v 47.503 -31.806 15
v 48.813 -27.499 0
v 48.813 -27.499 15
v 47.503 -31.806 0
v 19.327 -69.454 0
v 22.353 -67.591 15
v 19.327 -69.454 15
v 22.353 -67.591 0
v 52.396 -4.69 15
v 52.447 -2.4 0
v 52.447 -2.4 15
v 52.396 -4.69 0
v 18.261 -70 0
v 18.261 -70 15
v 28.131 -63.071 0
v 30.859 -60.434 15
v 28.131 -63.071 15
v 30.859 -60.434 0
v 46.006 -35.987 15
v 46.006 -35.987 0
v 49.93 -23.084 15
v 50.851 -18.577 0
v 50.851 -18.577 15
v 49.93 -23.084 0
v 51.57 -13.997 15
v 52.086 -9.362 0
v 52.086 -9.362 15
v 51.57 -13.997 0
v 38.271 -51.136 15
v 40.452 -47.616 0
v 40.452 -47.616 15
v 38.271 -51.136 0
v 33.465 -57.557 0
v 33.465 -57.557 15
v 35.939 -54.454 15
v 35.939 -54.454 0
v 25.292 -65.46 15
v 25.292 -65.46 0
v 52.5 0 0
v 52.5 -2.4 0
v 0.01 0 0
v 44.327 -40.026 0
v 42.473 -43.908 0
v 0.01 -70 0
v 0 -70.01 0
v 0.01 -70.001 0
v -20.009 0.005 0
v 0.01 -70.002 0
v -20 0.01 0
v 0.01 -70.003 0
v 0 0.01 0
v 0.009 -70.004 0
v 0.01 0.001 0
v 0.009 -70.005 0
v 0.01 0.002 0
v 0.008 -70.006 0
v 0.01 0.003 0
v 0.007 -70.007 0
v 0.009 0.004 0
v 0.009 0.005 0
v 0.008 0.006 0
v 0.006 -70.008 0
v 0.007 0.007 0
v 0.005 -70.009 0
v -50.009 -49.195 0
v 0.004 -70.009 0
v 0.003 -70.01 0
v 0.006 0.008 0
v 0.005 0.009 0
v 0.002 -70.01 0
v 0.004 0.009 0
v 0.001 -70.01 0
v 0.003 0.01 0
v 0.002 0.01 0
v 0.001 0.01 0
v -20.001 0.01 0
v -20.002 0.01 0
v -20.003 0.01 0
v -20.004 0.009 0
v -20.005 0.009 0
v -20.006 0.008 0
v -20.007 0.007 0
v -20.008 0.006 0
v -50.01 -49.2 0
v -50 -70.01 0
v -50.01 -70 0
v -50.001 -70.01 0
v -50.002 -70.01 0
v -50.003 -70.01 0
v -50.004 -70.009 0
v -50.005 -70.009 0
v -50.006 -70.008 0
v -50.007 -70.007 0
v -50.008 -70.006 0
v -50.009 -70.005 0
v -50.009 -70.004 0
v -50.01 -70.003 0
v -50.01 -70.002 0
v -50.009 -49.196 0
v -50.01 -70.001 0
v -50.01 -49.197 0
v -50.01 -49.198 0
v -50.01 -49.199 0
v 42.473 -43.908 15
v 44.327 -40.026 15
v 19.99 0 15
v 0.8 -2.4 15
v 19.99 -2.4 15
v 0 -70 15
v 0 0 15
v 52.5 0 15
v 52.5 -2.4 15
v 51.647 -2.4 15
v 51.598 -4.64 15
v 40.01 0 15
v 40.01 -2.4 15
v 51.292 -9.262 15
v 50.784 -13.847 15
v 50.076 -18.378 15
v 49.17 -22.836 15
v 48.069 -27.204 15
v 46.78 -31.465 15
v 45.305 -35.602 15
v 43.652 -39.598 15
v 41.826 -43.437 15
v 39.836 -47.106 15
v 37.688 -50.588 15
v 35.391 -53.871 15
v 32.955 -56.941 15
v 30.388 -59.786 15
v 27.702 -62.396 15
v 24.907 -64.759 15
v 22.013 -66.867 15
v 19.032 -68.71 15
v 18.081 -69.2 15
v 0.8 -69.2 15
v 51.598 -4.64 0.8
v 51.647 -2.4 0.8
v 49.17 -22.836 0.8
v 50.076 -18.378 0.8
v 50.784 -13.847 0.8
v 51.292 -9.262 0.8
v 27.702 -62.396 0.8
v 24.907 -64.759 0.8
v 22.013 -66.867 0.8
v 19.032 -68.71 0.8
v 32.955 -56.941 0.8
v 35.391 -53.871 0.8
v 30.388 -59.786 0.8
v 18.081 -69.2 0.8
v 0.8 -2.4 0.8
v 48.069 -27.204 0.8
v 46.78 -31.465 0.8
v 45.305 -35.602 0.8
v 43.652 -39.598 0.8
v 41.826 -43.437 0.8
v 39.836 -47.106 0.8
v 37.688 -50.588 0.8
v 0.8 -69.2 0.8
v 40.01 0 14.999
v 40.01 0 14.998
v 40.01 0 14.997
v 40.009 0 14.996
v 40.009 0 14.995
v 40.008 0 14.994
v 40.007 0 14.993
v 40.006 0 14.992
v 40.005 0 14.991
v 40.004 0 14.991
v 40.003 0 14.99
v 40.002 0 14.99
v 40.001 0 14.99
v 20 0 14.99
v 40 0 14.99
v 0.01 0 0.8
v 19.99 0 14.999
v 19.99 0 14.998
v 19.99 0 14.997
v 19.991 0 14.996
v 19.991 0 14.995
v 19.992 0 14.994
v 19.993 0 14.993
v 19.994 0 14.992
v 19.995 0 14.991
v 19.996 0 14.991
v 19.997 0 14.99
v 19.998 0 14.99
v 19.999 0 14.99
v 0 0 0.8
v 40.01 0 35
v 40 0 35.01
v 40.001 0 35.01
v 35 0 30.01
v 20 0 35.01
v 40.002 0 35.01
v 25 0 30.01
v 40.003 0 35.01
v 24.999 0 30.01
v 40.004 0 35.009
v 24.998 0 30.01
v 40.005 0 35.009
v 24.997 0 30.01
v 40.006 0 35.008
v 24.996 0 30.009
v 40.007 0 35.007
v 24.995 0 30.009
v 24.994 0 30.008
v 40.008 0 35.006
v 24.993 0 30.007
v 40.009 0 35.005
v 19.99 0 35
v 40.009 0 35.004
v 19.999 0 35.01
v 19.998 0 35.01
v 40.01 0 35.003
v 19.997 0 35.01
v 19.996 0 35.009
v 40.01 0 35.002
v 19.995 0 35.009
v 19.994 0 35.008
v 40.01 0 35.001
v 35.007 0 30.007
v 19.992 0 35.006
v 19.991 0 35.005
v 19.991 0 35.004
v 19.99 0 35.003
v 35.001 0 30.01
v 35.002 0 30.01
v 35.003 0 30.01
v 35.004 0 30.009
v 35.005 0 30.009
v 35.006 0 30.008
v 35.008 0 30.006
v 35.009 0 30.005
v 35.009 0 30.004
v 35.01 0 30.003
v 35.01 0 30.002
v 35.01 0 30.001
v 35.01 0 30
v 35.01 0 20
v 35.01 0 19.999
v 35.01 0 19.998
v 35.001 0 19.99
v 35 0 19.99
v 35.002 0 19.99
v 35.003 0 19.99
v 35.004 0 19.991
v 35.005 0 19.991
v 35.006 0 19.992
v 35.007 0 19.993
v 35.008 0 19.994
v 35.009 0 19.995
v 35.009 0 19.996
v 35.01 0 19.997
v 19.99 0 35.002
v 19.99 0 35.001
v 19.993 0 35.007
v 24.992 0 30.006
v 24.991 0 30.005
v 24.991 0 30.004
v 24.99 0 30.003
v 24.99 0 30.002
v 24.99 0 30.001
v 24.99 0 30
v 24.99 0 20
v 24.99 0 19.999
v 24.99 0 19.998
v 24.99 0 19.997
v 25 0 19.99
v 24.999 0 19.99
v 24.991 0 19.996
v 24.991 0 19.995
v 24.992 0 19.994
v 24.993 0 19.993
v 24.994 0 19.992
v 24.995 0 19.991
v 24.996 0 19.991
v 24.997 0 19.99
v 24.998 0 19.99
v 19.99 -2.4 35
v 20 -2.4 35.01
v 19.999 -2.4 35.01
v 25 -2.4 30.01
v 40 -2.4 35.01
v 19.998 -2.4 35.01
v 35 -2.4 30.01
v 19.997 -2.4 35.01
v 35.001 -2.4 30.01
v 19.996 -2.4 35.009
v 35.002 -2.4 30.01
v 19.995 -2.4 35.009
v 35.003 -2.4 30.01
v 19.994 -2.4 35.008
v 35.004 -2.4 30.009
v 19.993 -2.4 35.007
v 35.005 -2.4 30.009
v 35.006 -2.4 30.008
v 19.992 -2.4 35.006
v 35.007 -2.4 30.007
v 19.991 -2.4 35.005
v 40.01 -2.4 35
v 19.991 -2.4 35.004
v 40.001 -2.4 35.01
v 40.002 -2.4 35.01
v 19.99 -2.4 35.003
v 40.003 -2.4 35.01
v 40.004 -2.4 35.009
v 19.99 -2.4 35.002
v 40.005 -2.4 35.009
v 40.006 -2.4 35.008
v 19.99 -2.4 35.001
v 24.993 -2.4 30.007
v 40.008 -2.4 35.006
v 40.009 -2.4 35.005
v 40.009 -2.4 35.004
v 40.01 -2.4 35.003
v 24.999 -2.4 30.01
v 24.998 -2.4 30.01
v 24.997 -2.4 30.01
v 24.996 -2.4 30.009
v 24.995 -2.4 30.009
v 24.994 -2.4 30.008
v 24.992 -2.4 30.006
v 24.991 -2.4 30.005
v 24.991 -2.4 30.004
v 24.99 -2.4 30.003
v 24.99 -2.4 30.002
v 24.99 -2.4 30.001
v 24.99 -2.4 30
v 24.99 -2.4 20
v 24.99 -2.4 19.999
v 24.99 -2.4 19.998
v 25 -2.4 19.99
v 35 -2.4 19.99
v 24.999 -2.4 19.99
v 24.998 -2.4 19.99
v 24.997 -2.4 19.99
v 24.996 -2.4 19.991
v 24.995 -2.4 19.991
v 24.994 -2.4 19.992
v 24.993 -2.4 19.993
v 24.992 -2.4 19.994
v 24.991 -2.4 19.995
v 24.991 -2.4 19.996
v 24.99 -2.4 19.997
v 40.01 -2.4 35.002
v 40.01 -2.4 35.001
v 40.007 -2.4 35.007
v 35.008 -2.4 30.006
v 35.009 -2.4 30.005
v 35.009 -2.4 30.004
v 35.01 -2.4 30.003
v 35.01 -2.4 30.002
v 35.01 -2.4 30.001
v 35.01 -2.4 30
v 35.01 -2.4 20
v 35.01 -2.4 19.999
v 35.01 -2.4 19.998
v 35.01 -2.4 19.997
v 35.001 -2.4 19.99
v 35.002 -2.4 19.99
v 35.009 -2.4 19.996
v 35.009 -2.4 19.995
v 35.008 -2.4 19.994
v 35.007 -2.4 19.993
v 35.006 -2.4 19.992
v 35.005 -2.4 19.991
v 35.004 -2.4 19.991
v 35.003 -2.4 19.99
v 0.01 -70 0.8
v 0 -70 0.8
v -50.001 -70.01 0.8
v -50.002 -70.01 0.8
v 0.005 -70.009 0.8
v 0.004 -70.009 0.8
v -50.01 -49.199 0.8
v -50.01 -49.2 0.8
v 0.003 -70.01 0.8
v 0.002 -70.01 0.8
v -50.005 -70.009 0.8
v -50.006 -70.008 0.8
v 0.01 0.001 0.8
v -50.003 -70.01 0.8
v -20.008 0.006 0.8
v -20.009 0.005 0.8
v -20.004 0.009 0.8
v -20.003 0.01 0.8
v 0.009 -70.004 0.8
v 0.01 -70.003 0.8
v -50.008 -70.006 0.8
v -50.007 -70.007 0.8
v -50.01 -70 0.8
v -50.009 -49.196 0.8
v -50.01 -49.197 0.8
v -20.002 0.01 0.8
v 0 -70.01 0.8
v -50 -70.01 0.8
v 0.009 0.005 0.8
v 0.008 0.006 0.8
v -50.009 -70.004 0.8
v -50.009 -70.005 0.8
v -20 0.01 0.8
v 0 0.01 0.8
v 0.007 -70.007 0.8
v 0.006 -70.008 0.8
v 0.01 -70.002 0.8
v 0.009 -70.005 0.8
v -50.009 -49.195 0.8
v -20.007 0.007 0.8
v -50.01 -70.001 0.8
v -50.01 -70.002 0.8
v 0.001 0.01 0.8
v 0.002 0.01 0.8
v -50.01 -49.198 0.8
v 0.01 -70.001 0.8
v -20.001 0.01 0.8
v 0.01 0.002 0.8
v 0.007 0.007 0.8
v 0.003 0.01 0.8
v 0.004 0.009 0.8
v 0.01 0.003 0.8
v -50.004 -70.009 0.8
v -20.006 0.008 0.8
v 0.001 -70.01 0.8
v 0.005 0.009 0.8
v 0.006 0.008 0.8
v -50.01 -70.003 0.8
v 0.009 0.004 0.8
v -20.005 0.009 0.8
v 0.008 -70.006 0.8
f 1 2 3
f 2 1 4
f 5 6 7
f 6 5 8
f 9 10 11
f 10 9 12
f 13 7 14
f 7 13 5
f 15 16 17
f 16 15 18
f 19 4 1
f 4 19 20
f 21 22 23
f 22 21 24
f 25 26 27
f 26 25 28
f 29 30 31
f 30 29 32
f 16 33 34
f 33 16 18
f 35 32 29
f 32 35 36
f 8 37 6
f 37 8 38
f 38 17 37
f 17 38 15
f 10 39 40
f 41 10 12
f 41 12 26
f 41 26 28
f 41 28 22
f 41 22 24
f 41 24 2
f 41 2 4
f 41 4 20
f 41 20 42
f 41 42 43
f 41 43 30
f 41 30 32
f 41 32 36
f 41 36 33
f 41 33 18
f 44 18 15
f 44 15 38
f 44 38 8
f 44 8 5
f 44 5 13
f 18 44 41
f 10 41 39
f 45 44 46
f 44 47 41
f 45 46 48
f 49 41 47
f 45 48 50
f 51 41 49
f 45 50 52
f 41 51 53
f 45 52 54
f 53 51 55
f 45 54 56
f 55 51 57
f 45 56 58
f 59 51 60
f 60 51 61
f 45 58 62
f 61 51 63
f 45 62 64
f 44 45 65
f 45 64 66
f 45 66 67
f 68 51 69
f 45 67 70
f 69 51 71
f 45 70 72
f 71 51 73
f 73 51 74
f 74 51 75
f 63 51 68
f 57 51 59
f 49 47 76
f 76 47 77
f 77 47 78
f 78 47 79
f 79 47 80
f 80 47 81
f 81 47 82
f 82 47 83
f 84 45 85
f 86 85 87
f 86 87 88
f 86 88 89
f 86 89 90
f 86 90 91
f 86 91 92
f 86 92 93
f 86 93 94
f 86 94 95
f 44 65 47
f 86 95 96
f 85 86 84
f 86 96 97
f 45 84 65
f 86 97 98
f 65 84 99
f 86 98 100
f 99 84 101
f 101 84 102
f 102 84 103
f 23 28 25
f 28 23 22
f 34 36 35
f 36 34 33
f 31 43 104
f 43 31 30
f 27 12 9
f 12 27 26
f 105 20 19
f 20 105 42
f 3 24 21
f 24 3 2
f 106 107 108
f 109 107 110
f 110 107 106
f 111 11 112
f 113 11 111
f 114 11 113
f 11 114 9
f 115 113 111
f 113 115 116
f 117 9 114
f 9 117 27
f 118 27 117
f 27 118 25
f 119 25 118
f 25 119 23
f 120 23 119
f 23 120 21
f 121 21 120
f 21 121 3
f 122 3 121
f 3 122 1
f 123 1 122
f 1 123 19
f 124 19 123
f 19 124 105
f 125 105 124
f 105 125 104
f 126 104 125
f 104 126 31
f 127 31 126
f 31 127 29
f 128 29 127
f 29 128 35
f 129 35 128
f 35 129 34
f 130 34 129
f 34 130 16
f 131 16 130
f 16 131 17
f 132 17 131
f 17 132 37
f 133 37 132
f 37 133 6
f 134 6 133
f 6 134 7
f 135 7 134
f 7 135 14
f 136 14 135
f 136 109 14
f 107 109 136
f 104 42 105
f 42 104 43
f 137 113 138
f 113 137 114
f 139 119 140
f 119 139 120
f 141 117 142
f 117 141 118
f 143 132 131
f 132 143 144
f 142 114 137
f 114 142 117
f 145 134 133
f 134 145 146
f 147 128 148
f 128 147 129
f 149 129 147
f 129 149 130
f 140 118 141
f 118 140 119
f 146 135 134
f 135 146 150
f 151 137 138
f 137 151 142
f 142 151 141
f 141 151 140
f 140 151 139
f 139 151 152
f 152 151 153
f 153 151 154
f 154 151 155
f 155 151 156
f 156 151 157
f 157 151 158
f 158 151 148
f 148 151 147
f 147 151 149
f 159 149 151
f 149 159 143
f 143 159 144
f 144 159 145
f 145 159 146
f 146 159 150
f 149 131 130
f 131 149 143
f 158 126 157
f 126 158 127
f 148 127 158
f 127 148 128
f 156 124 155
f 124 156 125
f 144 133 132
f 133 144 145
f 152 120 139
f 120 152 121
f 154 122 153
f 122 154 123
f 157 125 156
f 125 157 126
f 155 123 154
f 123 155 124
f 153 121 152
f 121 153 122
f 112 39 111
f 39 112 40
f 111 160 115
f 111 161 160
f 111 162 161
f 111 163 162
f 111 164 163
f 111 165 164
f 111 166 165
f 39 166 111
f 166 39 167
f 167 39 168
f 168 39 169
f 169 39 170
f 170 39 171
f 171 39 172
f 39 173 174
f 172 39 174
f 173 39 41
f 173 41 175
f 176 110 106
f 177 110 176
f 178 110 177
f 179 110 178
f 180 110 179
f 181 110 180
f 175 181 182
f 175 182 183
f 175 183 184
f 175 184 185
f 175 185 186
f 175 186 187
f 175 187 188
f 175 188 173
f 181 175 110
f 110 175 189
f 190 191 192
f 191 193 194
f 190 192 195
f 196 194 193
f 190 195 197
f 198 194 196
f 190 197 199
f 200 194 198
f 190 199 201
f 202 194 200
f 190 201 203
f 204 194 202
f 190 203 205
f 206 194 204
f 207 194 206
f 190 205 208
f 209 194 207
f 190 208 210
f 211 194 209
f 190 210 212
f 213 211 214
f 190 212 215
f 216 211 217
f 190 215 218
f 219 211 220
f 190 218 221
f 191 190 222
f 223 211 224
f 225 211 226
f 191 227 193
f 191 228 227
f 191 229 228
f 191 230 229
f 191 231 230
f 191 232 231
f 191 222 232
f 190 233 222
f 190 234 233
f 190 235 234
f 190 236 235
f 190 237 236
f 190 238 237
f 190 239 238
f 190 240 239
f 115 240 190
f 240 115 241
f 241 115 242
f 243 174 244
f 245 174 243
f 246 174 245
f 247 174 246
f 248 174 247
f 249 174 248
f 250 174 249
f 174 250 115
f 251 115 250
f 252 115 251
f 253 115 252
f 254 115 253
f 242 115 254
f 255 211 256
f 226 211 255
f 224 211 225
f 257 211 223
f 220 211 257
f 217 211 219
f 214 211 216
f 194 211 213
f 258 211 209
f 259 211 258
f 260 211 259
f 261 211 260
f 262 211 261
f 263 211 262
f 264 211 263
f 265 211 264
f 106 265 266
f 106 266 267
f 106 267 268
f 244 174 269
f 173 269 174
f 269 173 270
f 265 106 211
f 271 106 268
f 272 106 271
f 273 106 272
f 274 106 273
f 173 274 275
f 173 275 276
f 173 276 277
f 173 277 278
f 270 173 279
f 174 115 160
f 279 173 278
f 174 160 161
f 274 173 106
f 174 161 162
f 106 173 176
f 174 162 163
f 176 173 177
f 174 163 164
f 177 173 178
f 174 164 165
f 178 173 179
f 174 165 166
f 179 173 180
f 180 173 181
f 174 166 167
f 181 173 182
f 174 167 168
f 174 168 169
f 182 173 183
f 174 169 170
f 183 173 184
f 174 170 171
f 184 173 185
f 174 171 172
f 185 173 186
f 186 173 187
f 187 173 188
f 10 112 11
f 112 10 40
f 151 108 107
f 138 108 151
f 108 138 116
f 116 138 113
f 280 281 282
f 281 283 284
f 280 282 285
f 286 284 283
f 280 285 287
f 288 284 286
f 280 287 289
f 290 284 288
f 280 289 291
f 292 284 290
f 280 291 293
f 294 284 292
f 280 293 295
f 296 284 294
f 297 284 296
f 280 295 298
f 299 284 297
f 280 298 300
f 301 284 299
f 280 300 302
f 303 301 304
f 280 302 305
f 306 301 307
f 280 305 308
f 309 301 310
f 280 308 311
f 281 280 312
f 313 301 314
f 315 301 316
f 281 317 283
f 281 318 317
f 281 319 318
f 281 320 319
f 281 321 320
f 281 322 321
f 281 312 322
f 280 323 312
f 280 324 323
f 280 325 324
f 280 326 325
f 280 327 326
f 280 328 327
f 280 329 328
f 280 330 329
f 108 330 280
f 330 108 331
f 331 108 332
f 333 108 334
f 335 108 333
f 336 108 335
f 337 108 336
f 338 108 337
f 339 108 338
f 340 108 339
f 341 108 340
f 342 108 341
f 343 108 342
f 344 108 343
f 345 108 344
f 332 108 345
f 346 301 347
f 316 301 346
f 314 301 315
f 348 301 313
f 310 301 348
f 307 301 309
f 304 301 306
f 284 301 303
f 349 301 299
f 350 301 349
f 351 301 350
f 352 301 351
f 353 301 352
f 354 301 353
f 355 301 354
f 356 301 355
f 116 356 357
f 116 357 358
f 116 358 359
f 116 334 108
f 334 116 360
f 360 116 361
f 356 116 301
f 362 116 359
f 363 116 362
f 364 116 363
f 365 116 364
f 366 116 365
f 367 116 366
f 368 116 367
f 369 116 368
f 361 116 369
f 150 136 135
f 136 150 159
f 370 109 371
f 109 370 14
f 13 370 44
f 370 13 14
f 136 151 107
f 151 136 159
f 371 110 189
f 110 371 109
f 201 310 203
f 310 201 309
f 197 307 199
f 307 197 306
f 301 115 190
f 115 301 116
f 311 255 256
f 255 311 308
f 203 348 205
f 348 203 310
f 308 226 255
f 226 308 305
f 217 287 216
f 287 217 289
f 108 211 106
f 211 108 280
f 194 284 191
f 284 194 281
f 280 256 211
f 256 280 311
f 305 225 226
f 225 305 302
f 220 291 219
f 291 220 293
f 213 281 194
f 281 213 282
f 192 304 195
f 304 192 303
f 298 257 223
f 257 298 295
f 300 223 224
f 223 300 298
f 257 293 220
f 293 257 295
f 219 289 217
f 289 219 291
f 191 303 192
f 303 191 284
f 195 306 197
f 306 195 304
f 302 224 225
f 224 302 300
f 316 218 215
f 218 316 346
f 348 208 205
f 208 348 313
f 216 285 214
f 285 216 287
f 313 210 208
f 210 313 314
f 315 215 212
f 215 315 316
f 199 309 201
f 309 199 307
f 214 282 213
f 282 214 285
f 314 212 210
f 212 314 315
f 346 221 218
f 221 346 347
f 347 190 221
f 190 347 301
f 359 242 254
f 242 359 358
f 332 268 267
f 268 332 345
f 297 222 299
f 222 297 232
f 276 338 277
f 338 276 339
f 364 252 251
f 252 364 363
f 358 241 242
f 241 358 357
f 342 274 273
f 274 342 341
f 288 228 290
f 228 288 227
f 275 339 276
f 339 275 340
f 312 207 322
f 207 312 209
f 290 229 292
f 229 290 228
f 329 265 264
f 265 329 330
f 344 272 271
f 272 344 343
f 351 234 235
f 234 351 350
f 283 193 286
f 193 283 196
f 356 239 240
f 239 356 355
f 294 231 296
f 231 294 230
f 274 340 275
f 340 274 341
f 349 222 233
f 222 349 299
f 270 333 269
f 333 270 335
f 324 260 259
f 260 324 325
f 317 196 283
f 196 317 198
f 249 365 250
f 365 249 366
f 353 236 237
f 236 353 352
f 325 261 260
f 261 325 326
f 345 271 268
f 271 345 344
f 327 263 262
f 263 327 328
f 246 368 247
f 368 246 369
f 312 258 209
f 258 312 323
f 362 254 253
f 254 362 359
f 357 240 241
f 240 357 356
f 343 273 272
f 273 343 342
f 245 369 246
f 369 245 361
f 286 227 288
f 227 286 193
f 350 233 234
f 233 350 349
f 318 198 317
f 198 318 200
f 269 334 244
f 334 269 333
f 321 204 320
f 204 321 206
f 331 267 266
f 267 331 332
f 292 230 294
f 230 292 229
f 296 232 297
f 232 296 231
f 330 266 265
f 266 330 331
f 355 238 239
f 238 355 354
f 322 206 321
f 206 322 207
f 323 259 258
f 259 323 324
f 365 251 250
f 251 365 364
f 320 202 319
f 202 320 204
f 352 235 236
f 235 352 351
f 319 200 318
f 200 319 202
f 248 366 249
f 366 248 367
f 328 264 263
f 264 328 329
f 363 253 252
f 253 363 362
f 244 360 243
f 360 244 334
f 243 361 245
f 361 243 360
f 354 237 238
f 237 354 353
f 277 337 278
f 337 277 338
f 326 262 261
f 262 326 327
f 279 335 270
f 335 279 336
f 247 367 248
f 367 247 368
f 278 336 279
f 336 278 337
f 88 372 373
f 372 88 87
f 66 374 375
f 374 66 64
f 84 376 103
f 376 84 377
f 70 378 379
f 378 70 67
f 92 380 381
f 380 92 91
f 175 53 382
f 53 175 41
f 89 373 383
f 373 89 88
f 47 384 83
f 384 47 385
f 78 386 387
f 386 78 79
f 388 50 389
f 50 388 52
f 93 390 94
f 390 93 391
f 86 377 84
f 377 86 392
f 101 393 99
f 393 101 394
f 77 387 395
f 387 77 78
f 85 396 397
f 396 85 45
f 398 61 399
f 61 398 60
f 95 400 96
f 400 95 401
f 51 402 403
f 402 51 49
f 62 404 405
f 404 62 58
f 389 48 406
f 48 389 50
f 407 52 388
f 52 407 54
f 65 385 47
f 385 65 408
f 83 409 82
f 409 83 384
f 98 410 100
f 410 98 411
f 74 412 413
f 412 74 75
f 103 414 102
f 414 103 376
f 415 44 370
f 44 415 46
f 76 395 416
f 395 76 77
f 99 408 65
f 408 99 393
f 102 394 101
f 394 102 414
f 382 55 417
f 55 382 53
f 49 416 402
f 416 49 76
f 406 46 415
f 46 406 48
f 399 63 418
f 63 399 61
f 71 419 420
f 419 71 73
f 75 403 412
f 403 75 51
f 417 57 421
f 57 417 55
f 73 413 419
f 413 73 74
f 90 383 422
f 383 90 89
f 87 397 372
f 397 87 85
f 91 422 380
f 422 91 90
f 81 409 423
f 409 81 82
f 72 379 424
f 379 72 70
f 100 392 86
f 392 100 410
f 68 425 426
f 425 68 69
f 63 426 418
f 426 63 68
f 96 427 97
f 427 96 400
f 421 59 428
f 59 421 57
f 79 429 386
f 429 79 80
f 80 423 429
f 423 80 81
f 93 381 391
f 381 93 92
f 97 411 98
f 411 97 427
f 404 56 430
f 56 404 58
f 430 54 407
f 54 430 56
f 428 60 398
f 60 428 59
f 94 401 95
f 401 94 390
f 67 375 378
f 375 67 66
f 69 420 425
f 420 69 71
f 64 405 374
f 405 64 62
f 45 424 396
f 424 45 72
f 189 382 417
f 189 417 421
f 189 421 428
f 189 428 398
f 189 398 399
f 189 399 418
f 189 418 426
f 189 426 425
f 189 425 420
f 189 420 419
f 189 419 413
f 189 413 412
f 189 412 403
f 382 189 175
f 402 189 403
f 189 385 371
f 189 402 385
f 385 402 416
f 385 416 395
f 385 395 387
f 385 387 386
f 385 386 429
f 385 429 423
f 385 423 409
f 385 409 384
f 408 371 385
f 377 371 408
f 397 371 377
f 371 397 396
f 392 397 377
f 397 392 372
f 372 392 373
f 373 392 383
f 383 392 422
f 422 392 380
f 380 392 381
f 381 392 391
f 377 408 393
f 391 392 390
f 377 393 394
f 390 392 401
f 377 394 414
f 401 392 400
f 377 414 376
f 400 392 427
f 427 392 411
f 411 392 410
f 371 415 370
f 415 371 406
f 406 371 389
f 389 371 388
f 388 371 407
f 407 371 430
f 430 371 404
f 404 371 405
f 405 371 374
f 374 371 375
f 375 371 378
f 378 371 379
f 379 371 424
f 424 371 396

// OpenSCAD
w = 52.5;  //rocker x dimension
l = 70;    //rocker y dimension
h = 15;    //0;    //length of rocker to print

x_delta = 0; //.5;  //manual compensation for rotation of the elipse
y_delta = 0; //1;  //manual compensation for rotation of the elipse

wall = 0.8; //1.2;
delta = 0.01;

cut = 5;

comp = 4.7; //was 4.5 in print //elipse compensation to extend beyond y dimension

plate_points = [ [0,0], [-20,0], [-50,-l+20+wall], [-50,-l], [0,-l] ];
tab_points = [ [20,h,0], [20,h+20,0], [40,h+20,0], [40,h,0] ];
tab_cut = [ [20+cut,h+cut,0], [20+cut,h+20-cut,0], [40-cut,h+20-cut,0], [40-cut,h+cut,0] ];

left_side = 0;  //referenced rocker panel section, for tab section use opposite
mount_plate = 1;
mount_tab = 1;

$fn=100;

module oval(w,h, height, center = false) {
 scale([1, h/w, 1]) cylinder(h=height, r=w, center=center);
}

module elipse(w,h, height, center = false) {
 scale([1, h/w, 1]) cylinder(h=height, r=w, center=center);
}

module rounded_box(points, radius, height){
    hull(){
        for (p = points){
            translate(p) cylinder(r=radius, h=height, $fn=60);
        }
    }
}

mirror([left_side,0,0]) {

    difference() {
        union () {
            difference() {
                rotate([0,0,90]) elipse(w=l+comp, h=w, height=h);
                rotate([0,0,90]) translate([0,0,wall]) elipse(w=l+comp-wall, h=w-wall, height=h+delta);
            }
            if (mount_tab == 0 ) {
               translate([-w,-wall,0]) cube([2*(w+x_delta),wall,h],center = false);
            }
            else {
               translate([-w,-3*wall,0]) cube([2*(w+x_delta),3*wall,h],center = false);
            }
                
            translate([-wall,-l,0]) cube([19,wall,h],center = false);
            rotate([0,0,90]) translate([-l+wall+y_delta,0,0]) cube([2*w,wall,h],center = false);
            rotate([0,0,90]) translate([-l+wall+y_delta,-wall,0]) cube([2*w,wall,h],center = false);
        }       
        translate([-100,0,-delta]) cube(200,center = false);
        rotate([0,0,90]) translate([-100,0,-delta]) cube(200,center = false);
        translate([0,-l+y_delta-20,-delta]) cube([20,20,200],center = false);
    }    
    if ( mount_plate == 1) {
        rounded_box(plate_points,0.01,wall);
    }
    if ( mount_tab == 1) {
        difference() {
            rotate([90,0,0])rounded_box(tab_points,0.01,3*wall);
            rotate([90,0,0])rounded_box(tab_cut,0.01,3*wall+delta);
        }
    }
        
}
 
